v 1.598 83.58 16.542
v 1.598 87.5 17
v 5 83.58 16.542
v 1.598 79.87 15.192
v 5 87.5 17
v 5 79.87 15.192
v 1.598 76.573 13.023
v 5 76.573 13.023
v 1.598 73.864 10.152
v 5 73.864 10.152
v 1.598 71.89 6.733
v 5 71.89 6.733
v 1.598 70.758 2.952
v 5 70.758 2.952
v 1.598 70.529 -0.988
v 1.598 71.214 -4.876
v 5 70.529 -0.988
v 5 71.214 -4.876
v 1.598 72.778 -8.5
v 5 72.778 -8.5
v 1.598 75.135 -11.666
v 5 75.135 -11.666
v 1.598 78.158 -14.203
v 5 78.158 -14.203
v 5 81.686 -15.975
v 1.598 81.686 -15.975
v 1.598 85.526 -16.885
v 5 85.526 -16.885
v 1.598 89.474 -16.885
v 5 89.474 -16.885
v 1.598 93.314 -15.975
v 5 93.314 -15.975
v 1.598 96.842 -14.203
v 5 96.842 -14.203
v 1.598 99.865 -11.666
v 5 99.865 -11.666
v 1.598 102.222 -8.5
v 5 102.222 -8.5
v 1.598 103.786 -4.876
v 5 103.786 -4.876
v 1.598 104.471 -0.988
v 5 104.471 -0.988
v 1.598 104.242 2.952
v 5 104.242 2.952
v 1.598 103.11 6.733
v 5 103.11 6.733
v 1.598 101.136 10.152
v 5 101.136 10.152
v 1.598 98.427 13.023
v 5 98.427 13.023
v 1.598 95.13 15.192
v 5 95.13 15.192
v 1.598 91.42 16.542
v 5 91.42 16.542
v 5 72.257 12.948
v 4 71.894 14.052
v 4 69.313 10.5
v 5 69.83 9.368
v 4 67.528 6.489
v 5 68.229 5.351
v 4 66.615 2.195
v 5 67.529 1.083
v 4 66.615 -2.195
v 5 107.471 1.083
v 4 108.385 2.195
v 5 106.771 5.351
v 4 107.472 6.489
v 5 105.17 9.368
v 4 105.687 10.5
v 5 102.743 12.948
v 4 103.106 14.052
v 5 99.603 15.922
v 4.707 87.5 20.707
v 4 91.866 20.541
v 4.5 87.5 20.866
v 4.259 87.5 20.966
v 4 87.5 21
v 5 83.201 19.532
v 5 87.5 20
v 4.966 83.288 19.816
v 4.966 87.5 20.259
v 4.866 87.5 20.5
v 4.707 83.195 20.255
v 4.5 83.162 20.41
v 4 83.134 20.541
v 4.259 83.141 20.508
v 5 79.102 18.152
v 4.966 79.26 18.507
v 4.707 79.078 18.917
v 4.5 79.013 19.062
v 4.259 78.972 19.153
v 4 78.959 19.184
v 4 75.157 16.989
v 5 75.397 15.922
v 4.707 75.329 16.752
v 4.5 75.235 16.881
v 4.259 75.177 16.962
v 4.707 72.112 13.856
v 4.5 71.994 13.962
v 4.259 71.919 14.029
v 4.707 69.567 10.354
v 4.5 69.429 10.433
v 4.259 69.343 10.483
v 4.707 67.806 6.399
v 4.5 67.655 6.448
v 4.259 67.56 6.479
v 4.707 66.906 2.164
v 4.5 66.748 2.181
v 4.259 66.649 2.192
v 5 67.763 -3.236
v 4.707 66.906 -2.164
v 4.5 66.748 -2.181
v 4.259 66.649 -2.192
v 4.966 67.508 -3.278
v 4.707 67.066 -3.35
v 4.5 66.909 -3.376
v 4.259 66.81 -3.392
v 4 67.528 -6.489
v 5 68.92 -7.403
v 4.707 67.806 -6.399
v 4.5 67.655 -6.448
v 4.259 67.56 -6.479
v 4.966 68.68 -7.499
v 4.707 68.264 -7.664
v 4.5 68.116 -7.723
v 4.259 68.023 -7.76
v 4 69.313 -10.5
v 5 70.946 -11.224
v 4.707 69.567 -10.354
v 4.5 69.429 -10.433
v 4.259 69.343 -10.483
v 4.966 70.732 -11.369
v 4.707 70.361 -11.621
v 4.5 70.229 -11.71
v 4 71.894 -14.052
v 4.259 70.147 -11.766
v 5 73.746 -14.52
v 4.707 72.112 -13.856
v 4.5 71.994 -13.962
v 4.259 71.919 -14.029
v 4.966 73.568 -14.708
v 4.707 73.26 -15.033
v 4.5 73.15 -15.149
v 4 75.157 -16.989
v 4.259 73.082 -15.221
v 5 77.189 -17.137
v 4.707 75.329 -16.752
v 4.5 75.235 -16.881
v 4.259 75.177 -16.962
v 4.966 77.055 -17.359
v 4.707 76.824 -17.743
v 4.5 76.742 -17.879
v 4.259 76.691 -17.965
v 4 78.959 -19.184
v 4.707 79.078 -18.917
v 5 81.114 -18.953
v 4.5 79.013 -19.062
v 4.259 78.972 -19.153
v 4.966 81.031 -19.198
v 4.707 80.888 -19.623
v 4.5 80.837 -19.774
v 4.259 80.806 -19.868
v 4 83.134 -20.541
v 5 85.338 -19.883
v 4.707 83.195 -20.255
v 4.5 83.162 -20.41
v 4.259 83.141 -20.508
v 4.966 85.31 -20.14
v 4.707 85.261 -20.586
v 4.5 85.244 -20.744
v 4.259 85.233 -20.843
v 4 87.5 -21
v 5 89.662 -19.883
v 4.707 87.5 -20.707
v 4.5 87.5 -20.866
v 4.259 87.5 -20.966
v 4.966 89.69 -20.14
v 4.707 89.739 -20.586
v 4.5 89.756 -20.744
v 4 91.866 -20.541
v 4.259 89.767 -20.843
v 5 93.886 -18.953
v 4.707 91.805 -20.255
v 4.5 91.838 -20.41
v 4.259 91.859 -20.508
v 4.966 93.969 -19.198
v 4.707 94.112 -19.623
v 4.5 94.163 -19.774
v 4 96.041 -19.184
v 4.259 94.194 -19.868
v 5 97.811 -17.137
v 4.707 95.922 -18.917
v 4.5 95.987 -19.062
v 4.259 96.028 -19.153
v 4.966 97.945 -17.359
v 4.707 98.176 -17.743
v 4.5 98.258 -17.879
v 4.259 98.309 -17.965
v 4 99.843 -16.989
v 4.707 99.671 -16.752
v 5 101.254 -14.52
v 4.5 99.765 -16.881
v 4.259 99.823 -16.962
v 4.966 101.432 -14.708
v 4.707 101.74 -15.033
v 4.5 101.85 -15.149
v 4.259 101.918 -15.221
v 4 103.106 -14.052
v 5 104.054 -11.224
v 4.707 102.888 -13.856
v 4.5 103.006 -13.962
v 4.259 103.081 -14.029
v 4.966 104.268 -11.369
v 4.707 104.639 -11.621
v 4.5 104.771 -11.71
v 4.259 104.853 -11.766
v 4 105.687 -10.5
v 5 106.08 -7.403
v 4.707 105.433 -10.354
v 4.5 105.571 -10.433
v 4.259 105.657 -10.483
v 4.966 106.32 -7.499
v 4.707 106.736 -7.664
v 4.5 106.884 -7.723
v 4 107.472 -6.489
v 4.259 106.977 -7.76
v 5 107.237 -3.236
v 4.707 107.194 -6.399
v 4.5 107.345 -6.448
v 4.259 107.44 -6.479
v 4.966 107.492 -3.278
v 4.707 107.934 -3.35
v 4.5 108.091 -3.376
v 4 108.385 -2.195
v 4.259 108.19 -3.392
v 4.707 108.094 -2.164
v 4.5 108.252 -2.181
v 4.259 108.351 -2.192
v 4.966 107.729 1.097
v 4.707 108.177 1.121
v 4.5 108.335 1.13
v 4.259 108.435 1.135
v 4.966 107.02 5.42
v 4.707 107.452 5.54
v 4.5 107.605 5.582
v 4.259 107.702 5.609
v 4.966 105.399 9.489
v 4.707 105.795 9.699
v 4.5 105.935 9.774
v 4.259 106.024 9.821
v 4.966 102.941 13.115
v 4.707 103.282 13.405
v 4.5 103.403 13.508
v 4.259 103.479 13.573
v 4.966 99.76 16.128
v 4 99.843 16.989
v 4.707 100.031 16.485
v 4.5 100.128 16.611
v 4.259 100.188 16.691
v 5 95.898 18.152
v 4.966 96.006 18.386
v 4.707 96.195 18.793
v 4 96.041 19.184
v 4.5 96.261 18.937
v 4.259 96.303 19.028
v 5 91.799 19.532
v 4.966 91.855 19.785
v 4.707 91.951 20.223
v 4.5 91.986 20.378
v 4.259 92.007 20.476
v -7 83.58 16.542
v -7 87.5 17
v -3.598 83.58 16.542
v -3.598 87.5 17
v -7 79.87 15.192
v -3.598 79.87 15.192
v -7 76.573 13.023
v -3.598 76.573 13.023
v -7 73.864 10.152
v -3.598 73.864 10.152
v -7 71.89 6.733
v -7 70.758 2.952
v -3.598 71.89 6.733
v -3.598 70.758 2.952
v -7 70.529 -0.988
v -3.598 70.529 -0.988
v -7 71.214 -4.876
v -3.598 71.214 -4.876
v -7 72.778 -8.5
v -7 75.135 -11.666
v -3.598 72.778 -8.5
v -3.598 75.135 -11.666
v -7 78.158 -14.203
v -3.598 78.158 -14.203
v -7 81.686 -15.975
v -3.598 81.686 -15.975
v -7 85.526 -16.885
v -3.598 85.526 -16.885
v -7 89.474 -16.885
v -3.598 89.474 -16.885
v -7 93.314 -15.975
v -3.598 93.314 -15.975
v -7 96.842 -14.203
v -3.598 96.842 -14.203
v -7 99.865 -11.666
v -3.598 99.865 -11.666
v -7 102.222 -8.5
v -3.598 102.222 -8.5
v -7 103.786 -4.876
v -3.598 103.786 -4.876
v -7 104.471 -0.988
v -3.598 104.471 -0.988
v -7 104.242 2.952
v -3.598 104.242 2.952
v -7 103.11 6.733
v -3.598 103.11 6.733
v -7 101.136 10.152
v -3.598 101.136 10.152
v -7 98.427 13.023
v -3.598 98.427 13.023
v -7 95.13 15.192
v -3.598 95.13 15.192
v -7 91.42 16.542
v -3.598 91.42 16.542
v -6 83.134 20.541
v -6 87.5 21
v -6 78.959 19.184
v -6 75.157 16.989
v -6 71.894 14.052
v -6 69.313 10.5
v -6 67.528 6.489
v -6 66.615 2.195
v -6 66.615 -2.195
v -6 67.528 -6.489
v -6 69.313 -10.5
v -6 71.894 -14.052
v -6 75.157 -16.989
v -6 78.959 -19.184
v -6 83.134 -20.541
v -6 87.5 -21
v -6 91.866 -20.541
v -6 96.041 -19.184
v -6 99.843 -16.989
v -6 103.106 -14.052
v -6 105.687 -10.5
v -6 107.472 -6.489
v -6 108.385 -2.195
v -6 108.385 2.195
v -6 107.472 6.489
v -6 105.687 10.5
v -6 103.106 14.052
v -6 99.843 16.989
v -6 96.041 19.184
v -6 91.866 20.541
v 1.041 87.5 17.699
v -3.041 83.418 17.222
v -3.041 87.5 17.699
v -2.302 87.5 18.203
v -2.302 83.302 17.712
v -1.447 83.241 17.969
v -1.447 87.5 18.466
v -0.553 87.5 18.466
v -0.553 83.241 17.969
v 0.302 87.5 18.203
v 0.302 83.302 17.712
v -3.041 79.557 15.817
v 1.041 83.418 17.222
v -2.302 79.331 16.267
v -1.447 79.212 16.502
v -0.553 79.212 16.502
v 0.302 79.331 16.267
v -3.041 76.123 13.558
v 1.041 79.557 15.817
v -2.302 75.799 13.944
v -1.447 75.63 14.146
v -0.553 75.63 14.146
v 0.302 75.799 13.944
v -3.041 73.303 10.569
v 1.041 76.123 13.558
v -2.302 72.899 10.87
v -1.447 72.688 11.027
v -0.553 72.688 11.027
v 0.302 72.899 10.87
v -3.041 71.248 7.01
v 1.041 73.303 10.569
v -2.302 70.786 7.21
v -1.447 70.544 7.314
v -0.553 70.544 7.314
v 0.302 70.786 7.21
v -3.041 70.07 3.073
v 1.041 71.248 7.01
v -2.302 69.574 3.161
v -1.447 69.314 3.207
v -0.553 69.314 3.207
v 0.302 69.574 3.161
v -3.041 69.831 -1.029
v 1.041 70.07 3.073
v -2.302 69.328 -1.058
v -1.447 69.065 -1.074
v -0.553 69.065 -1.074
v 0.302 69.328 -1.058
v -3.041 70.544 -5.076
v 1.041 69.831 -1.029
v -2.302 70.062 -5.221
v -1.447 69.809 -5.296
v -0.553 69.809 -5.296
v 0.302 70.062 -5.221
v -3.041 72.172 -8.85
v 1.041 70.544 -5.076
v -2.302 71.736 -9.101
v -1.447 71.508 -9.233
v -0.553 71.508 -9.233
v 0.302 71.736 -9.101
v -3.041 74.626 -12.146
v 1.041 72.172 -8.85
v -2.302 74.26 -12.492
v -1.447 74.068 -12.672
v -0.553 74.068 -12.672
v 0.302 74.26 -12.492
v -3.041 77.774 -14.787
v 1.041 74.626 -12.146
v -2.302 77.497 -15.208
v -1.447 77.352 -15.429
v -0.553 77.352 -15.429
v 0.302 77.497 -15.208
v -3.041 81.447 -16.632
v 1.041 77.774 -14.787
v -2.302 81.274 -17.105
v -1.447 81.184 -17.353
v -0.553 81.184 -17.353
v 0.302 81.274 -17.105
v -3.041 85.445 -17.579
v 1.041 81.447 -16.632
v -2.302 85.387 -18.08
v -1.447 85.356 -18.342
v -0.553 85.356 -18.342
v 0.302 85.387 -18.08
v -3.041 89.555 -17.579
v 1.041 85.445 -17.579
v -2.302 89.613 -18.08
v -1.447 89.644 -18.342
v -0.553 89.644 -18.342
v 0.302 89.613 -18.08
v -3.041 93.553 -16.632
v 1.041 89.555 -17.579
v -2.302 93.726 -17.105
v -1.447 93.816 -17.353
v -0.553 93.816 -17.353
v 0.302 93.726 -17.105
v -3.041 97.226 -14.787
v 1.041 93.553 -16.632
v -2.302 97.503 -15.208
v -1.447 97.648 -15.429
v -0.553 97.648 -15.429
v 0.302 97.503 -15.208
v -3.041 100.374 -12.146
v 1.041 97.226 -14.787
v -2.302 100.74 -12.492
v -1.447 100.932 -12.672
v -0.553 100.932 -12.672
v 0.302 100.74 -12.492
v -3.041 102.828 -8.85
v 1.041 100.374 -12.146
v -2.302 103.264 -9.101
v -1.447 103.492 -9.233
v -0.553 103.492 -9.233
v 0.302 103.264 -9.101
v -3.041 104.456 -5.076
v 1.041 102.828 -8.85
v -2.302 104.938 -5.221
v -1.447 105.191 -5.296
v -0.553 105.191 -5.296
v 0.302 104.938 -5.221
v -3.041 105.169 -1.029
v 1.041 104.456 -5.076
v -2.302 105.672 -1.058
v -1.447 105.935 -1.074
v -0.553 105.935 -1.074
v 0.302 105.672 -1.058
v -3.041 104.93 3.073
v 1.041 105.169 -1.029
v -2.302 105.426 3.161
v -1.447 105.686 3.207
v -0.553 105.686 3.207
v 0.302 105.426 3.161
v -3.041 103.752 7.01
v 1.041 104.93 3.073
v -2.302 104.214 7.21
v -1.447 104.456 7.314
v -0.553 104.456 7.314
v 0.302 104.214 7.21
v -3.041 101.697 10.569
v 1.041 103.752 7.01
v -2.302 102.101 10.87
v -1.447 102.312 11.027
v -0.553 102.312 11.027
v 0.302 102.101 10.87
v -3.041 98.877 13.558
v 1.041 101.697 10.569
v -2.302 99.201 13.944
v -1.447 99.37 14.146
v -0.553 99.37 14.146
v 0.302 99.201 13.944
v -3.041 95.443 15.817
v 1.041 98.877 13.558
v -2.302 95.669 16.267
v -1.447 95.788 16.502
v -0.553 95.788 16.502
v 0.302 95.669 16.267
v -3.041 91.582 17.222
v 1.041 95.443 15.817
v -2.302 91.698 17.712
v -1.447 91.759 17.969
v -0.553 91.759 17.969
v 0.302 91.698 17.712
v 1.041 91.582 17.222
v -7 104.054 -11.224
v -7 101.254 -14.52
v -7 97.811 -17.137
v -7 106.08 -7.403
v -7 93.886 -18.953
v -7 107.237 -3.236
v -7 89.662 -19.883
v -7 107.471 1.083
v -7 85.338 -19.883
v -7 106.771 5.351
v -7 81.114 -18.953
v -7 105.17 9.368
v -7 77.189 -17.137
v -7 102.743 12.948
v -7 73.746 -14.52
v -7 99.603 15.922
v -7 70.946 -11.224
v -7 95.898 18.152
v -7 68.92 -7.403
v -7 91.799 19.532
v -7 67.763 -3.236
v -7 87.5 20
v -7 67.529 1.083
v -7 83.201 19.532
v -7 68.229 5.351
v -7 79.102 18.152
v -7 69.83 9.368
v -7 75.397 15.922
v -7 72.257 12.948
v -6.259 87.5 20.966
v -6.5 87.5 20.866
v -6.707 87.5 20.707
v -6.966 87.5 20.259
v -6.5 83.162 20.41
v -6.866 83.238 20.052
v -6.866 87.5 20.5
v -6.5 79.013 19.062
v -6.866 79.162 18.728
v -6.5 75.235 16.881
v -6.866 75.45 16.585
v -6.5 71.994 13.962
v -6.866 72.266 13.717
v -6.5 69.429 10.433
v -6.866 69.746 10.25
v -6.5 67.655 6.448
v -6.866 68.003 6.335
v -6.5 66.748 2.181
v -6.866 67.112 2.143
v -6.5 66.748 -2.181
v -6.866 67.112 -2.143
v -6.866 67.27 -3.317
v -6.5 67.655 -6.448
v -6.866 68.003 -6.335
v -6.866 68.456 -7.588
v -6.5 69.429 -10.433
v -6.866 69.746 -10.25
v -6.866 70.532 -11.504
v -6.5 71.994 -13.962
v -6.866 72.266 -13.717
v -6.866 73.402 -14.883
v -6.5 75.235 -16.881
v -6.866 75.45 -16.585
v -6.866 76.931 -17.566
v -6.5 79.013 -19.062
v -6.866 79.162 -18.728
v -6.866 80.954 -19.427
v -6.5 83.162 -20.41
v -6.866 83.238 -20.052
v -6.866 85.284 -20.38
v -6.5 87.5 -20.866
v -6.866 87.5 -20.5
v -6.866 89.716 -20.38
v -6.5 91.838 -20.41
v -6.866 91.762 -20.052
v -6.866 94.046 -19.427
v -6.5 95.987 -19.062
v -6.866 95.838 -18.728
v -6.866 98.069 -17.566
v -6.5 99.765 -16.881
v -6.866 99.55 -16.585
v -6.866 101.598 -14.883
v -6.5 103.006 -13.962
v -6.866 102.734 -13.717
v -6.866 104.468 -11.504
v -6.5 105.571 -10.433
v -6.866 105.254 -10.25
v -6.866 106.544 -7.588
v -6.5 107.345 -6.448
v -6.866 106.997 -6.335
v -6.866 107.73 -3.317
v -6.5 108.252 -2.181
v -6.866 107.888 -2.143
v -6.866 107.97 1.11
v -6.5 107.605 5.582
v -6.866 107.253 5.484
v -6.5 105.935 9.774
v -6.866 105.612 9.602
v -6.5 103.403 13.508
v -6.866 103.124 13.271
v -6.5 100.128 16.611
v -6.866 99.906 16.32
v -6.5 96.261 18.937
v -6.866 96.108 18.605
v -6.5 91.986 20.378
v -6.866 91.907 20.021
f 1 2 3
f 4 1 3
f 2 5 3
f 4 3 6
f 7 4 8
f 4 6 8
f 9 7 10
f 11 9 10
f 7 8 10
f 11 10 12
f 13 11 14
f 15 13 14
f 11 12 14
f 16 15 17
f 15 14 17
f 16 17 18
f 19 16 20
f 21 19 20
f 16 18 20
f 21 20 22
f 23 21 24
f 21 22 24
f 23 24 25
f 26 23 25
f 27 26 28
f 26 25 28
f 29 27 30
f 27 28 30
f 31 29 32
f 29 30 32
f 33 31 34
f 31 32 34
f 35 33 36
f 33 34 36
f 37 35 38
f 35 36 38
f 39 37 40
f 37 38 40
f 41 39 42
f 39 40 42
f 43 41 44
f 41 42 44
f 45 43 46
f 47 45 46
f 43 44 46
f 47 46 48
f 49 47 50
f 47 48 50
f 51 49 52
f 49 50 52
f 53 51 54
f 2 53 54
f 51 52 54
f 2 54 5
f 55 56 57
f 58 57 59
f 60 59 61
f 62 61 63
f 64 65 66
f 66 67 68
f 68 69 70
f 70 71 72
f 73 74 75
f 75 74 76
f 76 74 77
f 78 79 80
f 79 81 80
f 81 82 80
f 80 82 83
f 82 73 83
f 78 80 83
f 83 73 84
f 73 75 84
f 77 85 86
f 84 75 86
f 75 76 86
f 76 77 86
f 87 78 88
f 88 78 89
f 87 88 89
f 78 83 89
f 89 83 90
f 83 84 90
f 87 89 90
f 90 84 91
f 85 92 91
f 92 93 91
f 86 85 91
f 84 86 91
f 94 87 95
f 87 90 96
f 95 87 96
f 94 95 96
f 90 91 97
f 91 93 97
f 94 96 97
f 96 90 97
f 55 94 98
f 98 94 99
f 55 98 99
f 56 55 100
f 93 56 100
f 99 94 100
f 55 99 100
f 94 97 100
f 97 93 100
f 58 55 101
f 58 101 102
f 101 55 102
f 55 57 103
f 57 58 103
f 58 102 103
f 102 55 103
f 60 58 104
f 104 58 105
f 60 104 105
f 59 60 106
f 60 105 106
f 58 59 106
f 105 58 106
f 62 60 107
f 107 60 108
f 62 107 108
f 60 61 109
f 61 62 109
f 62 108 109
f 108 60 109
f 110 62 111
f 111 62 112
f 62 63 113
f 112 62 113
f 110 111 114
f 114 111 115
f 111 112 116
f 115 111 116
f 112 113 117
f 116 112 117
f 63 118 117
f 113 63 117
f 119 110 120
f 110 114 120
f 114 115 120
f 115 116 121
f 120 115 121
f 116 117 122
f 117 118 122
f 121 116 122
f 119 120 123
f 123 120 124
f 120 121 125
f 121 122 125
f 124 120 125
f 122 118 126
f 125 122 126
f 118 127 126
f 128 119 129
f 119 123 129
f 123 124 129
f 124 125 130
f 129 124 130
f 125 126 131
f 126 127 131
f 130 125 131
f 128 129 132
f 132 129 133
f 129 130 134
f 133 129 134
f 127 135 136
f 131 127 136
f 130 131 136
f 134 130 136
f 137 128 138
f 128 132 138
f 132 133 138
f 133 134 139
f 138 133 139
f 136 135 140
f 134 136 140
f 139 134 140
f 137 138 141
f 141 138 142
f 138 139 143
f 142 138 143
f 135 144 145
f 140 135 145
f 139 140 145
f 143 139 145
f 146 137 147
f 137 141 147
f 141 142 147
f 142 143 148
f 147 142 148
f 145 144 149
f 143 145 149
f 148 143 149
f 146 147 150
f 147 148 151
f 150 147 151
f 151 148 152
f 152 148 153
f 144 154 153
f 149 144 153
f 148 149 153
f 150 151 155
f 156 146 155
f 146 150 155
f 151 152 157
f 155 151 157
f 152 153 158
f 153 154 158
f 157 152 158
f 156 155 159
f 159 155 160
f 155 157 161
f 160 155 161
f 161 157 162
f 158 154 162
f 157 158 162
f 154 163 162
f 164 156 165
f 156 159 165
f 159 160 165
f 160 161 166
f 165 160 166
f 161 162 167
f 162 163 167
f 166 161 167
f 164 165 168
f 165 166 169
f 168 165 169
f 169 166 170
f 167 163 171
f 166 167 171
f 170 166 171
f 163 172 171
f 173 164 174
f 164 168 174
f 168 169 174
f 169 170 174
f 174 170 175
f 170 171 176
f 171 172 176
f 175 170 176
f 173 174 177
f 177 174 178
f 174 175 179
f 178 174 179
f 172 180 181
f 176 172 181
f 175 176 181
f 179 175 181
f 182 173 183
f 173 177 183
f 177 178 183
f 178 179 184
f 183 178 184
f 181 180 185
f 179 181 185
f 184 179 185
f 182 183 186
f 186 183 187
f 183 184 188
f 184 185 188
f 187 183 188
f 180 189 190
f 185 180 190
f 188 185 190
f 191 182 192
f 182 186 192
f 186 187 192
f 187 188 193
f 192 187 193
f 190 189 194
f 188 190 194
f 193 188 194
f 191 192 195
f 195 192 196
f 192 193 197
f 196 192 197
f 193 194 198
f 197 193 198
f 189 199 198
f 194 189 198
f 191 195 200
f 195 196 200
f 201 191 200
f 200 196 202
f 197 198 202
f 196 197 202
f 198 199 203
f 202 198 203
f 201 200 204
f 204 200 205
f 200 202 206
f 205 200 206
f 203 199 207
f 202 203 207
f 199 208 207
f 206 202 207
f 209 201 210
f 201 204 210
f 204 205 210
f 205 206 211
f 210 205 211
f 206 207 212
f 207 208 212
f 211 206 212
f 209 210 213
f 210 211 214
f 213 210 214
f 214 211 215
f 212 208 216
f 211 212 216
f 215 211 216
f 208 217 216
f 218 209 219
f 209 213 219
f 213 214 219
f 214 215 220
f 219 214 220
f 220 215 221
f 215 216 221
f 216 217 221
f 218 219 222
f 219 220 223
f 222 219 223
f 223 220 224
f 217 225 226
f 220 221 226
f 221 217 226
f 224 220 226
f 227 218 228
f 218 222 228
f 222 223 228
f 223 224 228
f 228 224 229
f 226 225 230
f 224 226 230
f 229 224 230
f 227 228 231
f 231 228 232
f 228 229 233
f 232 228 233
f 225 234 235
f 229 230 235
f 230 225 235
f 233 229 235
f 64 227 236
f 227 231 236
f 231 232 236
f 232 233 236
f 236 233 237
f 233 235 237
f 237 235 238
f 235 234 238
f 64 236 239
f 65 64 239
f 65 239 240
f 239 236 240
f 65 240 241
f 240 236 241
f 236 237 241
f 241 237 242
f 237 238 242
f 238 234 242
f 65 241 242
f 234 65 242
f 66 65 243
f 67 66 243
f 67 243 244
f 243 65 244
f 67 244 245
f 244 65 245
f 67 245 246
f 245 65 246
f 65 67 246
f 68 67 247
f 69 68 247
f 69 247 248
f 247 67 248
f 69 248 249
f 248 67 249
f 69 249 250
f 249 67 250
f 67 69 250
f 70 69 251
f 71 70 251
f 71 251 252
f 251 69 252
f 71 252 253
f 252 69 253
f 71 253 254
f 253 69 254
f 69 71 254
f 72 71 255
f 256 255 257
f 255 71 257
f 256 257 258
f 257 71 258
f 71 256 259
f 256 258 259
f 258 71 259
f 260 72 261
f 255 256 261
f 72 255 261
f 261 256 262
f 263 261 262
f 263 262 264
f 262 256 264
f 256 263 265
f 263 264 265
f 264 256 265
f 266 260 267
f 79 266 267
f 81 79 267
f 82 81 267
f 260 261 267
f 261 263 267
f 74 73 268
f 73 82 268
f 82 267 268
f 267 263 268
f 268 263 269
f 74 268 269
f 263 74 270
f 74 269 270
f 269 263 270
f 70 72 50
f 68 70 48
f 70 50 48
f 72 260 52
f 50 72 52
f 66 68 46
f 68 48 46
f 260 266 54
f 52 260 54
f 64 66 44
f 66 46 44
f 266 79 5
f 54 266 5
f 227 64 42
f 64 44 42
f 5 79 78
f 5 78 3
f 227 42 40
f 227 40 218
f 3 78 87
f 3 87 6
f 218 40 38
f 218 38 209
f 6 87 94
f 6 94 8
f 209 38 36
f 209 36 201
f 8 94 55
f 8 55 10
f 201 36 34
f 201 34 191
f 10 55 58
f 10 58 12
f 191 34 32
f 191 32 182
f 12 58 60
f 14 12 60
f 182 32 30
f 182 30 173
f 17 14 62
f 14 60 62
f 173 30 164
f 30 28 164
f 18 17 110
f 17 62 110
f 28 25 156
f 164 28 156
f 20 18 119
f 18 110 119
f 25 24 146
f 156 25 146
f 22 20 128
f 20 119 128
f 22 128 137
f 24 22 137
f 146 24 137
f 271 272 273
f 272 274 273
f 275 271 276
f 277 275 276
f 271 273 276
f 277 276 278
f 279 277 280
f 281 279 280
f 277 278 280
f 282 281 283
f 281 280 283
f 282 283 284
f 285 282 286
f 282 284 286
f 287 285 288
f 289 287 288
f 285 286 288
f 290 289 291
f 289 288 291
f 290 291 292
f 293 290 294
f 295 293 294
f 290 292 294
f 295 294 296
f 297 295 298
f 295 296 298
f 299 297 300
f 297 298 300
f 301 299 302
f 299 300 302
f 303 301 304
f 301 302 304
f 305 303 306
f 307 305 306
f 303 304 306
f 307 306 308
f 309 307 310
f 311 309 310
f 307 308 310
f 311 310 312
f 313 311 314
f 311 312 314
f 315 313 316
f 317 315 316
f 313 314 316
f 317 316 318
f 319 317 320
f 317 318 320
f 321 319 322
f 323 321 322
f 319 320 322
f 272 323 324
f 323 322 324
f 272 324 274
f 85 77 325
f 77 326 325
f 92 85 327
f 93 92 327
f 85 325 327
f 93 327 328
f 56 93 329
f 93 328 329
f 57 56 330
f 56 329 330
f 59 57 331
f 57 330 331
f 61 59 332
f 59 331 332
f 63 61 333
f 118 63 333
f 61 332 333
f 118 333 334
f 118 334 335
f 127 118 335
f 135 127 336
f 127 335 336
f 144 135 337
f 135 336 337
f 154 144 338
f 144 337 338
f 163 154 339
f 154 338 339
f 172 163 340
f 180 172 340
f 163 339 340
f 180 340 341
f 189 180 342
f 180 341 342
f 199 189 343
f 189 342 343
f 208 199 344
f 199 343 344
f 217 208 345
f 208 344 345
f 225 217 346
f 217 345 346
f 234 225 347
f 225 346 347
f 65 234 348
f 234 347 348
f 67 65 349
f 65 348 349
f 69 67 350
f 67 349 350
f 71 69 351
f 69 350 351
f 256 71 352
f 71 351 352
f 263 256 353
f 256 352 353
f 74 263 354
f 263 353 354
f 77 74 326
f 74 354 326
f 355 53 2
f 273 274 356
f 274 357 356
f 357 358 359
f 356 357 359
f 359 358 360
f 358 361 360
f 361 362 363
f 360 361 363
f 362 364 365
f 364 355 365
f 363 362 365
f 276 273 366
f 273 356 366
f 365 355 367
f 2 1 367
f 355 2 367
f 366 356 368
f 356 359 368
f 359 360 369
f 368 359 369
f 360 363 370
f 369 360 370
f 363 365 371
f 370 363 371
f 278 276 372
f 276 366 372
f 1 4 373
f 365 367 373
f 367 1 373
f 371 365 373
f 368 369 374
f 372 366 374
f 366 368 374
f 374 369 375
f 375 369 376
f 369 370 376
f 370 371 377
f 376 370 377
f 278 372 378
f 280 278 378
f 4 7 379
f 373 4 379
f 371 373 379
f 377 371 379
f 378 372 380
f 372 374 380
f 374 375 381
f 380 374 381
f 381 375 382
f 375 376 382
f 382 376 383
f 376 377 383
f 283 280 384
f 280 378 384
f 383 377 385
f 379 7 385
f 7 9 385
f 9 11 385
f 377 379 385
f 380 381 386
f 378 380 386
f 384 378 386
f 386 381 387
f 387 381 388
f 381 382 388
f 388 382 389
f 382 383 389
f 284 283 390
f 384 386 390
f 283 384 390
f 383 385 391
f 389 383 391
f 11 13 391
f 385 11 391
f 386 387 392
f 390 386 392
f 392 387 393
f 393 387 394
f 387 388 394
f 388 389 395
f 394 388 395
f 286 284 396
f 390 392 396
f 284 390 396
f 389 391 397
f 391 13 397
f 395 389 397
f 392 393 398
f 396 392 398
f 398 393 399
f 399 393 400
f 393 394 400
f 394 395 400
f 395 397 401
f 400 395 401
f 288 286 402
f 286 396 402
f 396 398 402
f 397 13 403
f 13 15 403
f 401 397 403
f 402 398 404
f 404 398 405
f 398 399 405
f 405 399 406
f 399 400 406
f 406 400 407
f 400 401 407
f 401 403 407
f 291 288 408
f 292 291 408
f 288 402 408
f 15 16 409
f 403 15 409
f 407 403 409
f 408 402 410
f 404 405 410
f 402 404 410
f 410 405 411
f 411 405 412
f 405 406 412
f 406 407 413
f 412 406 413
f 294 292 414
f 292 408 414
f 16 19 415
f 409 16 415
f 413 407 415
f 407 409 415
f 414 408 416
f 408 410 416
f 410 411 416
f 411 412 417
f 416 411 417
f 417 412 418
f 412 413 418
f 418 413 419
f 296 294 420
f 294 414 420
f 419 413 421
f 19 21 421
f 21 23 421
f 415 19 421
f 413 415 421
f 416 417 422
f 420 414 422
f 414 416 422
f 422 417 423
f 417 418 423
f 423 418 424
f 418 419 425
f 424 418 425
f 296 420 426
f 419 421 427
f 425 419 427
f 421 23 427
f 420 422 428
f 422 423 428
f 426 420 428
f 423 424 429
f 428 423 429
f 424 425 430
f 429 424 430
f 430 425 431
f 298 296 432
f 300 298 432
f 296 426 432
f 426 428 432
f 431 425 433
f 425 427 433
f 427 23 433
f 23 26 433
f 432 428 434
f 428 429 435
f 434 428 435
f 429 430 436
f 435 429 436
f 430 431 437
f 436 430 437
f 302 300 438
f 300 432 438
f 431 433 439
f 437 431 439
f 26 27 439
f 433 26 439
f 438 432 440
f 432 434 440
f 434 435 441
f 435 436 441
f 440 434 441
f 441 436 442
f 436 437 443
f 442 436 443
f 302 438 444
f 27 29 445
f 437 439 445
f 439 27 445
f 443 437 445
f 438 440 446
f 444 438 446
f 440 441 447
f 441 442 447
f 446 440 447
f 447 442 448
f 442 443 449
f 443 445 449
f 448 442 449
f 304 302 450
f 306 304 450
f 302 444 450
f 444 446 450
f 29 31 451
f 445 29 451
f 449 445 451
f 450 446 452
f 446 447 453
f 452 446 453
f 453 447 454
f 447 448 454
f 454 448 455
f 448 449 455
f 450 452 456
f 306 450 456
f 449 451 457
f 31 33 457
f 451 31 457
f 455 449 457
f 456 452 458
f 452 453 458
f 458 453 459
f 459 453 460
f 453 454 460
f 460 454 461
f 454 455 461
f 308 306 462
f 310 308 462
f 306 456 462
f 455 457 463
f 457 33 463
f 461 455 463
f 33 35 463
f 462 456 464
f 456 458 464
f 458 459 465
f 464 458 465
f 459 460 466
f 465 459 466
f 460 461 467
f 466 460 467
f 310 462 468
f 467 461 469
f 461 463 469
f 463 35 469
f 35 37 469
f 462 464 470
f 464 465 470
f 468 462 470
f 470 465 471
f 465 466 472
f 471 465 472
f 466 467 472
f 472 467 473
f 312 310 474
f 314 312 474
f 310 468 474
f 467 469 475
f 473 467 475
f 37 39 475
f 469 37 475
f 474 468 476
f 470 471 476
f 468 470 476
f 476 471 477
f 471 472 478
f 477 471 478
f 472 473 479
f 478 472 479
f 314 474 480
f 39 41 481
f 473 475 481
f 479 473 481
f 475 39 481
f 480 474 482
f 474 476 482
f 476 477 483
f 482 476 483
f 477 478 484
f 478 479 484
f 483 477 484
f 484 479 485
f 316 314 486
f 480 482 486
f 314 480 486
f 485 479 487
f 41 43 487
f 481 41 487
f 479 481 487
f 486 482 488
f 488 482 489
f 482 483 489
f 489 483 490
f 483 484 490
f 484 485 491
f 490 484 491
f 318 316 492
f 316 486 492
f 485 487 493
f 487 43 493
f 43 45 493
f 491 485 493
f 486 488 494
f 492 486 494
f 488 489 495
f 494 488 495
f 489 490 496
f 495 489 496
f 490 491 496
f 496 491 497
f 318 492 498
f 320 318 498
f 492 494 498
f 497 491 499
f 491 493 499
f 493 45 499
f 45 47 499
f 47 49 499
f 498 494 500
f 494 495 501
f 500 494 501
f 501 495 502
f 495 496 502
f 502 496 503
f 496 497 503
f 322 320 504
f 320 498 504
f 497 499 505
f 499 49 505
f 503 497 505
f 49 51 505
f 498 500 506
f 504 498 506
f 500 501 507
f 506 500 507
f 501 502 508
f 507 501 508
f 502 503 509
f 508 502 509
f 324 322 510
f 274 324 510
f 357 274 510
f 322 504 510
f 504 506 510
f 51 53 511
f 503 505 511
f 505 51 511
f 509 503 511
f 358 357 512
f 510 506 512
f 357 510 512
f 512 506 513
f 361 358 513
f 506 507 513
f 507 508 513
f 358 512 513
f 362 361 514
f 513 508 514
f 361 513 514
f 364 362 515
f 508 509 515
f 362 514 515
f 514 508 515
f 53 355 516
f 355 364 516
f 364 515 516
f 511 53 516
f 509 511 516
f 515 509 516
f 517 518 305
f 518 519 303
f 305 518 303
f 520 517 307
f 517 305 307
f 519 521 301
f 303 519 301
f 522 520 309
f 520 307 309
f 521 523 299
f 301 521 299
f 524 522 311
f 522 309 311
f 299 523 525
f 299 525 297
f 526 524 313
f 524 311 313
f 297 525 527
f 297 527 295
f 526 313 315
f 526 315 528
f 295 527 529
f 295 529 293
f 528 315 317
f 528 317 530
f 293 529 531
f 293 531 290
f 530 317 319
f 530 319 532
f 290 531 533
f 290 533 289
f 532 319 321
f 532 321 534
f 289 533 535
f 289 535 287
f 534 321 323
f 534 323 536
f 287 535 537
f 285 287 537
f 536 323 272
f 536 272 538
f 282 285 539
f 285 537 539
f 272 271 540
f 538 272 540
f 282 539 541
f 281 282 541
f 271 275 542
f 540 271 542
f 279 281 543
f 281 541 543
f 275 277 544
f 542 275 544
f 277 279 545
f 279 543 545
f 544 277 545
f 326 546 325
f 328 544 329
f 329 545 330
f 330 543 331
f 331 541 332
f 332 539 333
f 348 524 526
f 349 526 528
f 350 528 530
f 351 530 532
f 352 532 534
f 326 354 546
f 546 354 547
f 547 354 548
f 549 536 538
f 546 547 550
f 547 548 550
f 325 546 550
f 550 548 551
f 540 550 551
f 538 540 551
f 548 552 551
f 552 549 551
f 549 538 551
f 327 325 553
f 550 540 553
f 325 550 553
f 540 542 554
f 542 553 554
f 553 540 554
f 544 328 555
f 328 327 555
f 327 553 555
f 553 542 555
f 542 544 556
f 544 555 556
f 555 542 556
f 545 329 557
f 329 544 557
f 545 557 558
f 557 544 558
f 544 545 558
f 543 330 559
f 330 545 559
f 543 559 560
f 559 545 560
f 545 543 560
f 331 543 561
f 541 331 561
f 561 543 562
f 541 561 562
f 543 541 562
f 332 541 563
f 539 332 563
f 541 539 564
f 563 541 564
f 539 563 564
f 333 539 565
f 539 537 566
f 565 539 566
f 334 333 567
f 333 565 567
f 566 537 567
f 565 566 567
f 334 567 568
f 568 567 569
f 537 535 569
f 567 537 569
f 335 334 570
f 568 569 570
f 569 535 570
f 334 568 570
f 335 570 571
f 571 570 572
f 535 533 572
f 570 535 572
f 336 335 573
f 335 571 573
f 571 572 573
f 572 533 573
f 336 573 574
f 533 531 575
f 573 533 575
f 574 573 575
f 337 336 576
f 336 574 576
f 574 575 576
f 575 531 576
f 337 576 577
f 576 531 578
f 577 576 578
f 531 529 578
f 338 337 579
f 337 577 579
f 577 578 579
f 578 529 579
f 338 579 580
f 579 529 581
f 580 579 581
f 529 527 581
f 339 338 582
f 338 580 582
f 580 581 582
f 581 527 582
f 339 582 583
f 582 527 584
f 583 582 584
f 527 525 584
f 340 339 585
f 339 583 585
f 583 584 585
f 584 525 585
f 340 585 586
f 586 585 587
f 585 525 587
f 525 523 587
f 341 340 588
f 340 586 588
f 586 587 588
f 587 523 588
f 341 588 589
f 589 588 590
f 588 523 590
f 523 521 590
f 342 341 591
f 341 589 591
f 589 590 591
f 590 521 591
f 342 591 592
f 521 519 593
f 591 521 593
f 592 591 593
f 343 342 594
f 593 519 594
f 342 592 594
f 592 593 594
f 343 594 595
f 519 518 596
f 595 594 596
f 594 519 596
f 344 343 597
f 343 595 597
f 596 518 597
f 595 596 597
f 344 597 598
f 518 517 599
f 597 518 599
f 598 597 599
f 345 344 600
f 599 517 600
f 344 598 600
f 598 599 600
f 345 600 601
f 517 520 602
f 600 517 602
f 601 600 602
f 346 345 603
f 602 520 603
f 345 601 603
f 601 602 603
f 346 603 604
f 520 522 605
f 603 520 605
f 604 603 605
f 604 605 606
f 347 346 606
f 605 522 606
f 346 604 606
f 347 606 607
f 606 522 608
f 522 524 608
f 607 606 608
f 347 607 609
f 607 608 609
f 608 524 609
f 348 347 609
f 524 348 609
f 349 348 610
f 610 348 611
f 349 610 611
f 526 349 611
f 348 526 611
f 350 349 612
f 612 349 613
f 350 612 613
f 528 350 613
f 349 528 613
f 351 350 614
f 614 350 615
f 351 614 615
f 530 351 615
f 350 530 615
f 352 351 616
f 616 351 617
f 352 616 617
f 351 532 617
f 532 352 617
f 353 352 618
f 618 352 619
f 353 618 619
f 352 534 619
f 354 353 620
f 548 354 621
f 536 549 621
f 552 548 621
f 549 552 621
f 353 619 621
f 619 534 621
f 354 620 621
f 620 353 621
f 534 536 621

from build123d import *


with BuildPart() as part:
    # Esquisse1 → Base-Révolution (revolve)
    with BuildSketch(Plane.XY, mode=Mode.PRIVATE) as base_r_volution_sk:
        with BuildLine():
            Line((-7, 104.5), (-3.598076211, 104.5))
            ThreePointArc((-3.598076211, 104.5), (-1, 106), (1.598076211, 104.5))
            Line((1.598076211, 104.5), (5, 104.5))
            Line((5, 104.5), (5, 107.5))
            ThreePointArc((5, 107.5), (4.707106781, 108.207106781), (4, 108.5))
            Line((4, 108.5), (-6, 108.5))
            ThreePointArc((-6, 108.5), (-6.707106781, 108.207106781), (-7, 107.5))
            Line((-7, 107.5), (-7, 104.5))
        make_face()
    revolve(base_r_volution_sk.sketch.rotate(Axis((-11.189264063, 87.5, 0), (1, 0, 0)), 90), axis=Axis((-11.189264063, 87.5, 0), (1, 0, 0)))


solid = part.part
